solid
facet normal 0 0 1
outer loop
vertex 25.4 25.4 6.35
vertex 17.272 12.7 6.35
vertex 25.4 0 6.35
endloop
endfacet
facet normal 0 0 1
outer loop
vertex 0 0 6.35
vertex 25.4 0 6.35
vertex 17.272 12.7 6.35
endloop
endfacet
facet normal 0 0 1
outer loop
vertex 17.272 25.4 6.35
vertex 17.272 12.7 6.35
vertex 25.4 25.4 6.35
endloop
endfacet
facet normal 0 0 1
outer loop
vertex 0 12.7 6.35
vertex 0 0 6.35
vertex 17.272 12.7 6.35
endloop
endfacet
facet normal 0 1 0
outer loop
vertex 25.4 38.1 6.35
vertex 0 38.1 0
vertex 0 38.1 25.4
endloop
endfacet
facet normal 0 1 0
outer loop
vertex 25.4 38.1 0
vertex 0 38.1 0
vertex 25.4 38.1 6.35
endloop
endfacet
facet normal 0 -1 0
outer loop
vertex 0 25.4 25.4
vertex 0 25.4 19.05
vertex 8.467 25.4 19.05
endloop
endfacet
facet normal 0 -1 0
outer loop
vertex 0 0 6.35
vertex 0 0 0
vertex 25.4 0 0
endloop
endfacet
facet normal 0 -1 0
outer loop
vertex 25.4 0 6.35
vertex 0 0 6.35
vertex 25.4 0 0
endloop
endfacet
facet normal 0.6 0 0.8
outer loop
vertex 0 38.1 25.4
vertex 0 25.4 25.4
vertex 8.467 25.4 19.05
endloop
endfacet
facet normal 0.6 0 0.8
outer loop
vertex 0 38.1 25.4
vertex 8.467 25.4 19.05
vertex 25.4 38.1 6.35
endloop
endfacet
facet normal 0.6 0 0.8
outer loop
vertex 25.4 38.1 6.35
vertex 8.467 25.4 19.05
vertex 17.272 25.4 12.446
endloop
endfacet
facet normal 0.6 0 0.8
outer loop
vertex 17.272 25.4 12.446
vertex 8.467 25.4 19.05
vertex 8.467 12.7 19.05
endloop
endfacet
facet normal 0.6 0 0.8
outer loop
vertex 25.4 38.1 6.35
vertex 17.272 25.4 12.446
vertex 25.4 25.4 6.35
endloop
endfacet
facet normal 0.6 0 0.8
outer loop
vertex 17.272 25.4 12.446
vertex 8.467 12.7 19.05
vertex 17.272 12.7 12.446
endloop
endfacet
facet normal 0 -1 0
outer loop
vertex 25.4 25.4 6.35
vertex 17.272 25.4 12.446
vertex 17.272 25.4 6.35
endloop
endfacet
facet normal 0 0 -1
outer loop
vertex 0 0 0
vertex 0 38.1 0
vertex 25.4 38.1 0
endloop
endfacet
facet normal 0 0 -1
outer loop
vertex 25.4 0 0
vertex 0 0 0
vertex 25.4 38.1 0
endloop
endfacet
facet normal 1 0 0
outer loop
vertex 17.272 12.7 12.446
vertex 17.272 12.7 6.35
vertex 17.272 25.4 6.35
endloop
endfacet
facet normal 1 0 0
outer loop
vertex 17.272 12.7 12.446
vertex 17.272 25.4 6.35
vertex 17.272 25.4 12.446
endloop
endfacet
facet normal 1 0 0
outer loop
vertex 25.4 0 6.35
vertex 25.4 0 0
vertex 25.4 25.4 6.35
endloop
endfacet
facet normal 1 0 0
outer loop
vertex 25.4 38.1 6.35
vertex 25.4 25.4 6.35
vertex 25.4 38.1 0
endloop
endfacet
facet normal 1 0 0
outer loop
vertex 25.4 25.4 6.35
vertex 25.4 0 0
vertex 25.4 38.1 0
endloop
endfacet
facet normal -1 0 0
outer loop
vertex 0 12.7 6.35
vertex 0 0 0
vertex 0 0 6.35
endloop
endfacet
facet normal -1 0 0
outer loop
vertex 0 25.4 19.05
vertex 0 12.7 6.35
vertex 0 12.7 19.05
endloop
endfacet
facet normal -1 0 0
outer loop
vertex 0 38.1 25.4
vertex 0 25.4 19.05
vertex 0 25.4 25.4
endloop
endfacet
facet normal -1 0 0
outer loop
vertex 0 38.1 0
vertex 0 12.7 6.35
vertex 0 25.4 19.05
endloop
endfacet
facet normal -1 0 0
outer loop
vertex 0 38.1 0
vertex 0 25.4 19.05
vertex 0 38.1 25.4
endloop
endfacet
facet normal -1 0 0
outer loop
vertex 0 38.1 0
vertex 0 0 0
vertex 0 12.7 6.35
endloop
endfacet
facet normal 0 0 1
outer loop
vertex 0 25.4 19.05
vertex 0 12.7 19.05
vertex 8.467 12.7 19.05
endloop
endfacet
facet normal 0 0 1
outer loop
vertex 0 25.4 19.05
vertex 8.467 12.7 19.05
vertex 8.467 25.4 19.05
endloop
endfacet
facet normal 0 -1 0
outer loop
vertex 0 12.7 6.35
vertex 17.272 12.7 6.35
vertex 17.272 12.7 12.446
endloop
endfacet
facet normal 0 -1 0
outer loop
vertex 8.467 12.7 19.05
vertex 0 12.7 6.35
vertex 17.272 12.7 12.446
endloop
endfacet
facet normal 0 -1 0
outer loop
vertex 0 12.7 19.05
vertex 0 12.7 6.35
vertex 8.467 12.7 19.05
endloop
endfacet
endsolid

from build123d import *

# Parameters (mm, degrees)
F0_W      = 25.4
F0_H      = 38.1
F1_DEPTH  = 25.4
F3_DEPTH  = 50.8
F4_W      = 12.7
F4_H      = 19.05
F5_DEPTH  = 50.8
F7_W      = 12.7
F7_H      = 6.35
F8_DEPTH  = 25.4
F9_W      = 8.128
F9_H      = 6.35
F10_DEPTH = 25.4


with BuildPart() as f1:
    # F0 (on Top) → F1 (new body)
    with BuildSketch(Plane.XY):
        with Locations((12.7, 19.05)):
            Rectangle(F0_W, F0_H)
    extrude(amount=F1_DEPTH)

    # F2 (on Front) → F3 (cut)
    with BuildSketch(Plane.XZ):
        Polygon((25.4, 25.4), (0, 25.4), (25.4, 6.35), align=None)
    extrude(amount=-F3_DEPTH, mode=Mode.SUBTRACT)

    # F4 (on Right) → F5 (cut)
    with BuildSketch(Plane.YZ):
        with Locations((6.35, 15.875)):
            Rectangle(F4_W, F4_H)
    extrude(amount=F5_DEPTH, mode=Mode.SUBTRACT)

    # F7 (on Right) → F8 (cut)
    with BuildSketch(Plane.YZ):
        with Locations((19.05, 22.225)):
            Rectangle(F7_W, F7_H)
    extrude(amount=F8_DEPTH, mode=Mode.SUBTRACT)

    # F9 (on Front) → F10 (cut)
    with BuildSketch(Plane.XZ):
        with Locations((21.336, 9.525)):
            Rectangle(F9_W, F9_H)
    extrude(amount=-F10_DEPTH, mode=Mode.SUBTRACT)


solid = f1.part
